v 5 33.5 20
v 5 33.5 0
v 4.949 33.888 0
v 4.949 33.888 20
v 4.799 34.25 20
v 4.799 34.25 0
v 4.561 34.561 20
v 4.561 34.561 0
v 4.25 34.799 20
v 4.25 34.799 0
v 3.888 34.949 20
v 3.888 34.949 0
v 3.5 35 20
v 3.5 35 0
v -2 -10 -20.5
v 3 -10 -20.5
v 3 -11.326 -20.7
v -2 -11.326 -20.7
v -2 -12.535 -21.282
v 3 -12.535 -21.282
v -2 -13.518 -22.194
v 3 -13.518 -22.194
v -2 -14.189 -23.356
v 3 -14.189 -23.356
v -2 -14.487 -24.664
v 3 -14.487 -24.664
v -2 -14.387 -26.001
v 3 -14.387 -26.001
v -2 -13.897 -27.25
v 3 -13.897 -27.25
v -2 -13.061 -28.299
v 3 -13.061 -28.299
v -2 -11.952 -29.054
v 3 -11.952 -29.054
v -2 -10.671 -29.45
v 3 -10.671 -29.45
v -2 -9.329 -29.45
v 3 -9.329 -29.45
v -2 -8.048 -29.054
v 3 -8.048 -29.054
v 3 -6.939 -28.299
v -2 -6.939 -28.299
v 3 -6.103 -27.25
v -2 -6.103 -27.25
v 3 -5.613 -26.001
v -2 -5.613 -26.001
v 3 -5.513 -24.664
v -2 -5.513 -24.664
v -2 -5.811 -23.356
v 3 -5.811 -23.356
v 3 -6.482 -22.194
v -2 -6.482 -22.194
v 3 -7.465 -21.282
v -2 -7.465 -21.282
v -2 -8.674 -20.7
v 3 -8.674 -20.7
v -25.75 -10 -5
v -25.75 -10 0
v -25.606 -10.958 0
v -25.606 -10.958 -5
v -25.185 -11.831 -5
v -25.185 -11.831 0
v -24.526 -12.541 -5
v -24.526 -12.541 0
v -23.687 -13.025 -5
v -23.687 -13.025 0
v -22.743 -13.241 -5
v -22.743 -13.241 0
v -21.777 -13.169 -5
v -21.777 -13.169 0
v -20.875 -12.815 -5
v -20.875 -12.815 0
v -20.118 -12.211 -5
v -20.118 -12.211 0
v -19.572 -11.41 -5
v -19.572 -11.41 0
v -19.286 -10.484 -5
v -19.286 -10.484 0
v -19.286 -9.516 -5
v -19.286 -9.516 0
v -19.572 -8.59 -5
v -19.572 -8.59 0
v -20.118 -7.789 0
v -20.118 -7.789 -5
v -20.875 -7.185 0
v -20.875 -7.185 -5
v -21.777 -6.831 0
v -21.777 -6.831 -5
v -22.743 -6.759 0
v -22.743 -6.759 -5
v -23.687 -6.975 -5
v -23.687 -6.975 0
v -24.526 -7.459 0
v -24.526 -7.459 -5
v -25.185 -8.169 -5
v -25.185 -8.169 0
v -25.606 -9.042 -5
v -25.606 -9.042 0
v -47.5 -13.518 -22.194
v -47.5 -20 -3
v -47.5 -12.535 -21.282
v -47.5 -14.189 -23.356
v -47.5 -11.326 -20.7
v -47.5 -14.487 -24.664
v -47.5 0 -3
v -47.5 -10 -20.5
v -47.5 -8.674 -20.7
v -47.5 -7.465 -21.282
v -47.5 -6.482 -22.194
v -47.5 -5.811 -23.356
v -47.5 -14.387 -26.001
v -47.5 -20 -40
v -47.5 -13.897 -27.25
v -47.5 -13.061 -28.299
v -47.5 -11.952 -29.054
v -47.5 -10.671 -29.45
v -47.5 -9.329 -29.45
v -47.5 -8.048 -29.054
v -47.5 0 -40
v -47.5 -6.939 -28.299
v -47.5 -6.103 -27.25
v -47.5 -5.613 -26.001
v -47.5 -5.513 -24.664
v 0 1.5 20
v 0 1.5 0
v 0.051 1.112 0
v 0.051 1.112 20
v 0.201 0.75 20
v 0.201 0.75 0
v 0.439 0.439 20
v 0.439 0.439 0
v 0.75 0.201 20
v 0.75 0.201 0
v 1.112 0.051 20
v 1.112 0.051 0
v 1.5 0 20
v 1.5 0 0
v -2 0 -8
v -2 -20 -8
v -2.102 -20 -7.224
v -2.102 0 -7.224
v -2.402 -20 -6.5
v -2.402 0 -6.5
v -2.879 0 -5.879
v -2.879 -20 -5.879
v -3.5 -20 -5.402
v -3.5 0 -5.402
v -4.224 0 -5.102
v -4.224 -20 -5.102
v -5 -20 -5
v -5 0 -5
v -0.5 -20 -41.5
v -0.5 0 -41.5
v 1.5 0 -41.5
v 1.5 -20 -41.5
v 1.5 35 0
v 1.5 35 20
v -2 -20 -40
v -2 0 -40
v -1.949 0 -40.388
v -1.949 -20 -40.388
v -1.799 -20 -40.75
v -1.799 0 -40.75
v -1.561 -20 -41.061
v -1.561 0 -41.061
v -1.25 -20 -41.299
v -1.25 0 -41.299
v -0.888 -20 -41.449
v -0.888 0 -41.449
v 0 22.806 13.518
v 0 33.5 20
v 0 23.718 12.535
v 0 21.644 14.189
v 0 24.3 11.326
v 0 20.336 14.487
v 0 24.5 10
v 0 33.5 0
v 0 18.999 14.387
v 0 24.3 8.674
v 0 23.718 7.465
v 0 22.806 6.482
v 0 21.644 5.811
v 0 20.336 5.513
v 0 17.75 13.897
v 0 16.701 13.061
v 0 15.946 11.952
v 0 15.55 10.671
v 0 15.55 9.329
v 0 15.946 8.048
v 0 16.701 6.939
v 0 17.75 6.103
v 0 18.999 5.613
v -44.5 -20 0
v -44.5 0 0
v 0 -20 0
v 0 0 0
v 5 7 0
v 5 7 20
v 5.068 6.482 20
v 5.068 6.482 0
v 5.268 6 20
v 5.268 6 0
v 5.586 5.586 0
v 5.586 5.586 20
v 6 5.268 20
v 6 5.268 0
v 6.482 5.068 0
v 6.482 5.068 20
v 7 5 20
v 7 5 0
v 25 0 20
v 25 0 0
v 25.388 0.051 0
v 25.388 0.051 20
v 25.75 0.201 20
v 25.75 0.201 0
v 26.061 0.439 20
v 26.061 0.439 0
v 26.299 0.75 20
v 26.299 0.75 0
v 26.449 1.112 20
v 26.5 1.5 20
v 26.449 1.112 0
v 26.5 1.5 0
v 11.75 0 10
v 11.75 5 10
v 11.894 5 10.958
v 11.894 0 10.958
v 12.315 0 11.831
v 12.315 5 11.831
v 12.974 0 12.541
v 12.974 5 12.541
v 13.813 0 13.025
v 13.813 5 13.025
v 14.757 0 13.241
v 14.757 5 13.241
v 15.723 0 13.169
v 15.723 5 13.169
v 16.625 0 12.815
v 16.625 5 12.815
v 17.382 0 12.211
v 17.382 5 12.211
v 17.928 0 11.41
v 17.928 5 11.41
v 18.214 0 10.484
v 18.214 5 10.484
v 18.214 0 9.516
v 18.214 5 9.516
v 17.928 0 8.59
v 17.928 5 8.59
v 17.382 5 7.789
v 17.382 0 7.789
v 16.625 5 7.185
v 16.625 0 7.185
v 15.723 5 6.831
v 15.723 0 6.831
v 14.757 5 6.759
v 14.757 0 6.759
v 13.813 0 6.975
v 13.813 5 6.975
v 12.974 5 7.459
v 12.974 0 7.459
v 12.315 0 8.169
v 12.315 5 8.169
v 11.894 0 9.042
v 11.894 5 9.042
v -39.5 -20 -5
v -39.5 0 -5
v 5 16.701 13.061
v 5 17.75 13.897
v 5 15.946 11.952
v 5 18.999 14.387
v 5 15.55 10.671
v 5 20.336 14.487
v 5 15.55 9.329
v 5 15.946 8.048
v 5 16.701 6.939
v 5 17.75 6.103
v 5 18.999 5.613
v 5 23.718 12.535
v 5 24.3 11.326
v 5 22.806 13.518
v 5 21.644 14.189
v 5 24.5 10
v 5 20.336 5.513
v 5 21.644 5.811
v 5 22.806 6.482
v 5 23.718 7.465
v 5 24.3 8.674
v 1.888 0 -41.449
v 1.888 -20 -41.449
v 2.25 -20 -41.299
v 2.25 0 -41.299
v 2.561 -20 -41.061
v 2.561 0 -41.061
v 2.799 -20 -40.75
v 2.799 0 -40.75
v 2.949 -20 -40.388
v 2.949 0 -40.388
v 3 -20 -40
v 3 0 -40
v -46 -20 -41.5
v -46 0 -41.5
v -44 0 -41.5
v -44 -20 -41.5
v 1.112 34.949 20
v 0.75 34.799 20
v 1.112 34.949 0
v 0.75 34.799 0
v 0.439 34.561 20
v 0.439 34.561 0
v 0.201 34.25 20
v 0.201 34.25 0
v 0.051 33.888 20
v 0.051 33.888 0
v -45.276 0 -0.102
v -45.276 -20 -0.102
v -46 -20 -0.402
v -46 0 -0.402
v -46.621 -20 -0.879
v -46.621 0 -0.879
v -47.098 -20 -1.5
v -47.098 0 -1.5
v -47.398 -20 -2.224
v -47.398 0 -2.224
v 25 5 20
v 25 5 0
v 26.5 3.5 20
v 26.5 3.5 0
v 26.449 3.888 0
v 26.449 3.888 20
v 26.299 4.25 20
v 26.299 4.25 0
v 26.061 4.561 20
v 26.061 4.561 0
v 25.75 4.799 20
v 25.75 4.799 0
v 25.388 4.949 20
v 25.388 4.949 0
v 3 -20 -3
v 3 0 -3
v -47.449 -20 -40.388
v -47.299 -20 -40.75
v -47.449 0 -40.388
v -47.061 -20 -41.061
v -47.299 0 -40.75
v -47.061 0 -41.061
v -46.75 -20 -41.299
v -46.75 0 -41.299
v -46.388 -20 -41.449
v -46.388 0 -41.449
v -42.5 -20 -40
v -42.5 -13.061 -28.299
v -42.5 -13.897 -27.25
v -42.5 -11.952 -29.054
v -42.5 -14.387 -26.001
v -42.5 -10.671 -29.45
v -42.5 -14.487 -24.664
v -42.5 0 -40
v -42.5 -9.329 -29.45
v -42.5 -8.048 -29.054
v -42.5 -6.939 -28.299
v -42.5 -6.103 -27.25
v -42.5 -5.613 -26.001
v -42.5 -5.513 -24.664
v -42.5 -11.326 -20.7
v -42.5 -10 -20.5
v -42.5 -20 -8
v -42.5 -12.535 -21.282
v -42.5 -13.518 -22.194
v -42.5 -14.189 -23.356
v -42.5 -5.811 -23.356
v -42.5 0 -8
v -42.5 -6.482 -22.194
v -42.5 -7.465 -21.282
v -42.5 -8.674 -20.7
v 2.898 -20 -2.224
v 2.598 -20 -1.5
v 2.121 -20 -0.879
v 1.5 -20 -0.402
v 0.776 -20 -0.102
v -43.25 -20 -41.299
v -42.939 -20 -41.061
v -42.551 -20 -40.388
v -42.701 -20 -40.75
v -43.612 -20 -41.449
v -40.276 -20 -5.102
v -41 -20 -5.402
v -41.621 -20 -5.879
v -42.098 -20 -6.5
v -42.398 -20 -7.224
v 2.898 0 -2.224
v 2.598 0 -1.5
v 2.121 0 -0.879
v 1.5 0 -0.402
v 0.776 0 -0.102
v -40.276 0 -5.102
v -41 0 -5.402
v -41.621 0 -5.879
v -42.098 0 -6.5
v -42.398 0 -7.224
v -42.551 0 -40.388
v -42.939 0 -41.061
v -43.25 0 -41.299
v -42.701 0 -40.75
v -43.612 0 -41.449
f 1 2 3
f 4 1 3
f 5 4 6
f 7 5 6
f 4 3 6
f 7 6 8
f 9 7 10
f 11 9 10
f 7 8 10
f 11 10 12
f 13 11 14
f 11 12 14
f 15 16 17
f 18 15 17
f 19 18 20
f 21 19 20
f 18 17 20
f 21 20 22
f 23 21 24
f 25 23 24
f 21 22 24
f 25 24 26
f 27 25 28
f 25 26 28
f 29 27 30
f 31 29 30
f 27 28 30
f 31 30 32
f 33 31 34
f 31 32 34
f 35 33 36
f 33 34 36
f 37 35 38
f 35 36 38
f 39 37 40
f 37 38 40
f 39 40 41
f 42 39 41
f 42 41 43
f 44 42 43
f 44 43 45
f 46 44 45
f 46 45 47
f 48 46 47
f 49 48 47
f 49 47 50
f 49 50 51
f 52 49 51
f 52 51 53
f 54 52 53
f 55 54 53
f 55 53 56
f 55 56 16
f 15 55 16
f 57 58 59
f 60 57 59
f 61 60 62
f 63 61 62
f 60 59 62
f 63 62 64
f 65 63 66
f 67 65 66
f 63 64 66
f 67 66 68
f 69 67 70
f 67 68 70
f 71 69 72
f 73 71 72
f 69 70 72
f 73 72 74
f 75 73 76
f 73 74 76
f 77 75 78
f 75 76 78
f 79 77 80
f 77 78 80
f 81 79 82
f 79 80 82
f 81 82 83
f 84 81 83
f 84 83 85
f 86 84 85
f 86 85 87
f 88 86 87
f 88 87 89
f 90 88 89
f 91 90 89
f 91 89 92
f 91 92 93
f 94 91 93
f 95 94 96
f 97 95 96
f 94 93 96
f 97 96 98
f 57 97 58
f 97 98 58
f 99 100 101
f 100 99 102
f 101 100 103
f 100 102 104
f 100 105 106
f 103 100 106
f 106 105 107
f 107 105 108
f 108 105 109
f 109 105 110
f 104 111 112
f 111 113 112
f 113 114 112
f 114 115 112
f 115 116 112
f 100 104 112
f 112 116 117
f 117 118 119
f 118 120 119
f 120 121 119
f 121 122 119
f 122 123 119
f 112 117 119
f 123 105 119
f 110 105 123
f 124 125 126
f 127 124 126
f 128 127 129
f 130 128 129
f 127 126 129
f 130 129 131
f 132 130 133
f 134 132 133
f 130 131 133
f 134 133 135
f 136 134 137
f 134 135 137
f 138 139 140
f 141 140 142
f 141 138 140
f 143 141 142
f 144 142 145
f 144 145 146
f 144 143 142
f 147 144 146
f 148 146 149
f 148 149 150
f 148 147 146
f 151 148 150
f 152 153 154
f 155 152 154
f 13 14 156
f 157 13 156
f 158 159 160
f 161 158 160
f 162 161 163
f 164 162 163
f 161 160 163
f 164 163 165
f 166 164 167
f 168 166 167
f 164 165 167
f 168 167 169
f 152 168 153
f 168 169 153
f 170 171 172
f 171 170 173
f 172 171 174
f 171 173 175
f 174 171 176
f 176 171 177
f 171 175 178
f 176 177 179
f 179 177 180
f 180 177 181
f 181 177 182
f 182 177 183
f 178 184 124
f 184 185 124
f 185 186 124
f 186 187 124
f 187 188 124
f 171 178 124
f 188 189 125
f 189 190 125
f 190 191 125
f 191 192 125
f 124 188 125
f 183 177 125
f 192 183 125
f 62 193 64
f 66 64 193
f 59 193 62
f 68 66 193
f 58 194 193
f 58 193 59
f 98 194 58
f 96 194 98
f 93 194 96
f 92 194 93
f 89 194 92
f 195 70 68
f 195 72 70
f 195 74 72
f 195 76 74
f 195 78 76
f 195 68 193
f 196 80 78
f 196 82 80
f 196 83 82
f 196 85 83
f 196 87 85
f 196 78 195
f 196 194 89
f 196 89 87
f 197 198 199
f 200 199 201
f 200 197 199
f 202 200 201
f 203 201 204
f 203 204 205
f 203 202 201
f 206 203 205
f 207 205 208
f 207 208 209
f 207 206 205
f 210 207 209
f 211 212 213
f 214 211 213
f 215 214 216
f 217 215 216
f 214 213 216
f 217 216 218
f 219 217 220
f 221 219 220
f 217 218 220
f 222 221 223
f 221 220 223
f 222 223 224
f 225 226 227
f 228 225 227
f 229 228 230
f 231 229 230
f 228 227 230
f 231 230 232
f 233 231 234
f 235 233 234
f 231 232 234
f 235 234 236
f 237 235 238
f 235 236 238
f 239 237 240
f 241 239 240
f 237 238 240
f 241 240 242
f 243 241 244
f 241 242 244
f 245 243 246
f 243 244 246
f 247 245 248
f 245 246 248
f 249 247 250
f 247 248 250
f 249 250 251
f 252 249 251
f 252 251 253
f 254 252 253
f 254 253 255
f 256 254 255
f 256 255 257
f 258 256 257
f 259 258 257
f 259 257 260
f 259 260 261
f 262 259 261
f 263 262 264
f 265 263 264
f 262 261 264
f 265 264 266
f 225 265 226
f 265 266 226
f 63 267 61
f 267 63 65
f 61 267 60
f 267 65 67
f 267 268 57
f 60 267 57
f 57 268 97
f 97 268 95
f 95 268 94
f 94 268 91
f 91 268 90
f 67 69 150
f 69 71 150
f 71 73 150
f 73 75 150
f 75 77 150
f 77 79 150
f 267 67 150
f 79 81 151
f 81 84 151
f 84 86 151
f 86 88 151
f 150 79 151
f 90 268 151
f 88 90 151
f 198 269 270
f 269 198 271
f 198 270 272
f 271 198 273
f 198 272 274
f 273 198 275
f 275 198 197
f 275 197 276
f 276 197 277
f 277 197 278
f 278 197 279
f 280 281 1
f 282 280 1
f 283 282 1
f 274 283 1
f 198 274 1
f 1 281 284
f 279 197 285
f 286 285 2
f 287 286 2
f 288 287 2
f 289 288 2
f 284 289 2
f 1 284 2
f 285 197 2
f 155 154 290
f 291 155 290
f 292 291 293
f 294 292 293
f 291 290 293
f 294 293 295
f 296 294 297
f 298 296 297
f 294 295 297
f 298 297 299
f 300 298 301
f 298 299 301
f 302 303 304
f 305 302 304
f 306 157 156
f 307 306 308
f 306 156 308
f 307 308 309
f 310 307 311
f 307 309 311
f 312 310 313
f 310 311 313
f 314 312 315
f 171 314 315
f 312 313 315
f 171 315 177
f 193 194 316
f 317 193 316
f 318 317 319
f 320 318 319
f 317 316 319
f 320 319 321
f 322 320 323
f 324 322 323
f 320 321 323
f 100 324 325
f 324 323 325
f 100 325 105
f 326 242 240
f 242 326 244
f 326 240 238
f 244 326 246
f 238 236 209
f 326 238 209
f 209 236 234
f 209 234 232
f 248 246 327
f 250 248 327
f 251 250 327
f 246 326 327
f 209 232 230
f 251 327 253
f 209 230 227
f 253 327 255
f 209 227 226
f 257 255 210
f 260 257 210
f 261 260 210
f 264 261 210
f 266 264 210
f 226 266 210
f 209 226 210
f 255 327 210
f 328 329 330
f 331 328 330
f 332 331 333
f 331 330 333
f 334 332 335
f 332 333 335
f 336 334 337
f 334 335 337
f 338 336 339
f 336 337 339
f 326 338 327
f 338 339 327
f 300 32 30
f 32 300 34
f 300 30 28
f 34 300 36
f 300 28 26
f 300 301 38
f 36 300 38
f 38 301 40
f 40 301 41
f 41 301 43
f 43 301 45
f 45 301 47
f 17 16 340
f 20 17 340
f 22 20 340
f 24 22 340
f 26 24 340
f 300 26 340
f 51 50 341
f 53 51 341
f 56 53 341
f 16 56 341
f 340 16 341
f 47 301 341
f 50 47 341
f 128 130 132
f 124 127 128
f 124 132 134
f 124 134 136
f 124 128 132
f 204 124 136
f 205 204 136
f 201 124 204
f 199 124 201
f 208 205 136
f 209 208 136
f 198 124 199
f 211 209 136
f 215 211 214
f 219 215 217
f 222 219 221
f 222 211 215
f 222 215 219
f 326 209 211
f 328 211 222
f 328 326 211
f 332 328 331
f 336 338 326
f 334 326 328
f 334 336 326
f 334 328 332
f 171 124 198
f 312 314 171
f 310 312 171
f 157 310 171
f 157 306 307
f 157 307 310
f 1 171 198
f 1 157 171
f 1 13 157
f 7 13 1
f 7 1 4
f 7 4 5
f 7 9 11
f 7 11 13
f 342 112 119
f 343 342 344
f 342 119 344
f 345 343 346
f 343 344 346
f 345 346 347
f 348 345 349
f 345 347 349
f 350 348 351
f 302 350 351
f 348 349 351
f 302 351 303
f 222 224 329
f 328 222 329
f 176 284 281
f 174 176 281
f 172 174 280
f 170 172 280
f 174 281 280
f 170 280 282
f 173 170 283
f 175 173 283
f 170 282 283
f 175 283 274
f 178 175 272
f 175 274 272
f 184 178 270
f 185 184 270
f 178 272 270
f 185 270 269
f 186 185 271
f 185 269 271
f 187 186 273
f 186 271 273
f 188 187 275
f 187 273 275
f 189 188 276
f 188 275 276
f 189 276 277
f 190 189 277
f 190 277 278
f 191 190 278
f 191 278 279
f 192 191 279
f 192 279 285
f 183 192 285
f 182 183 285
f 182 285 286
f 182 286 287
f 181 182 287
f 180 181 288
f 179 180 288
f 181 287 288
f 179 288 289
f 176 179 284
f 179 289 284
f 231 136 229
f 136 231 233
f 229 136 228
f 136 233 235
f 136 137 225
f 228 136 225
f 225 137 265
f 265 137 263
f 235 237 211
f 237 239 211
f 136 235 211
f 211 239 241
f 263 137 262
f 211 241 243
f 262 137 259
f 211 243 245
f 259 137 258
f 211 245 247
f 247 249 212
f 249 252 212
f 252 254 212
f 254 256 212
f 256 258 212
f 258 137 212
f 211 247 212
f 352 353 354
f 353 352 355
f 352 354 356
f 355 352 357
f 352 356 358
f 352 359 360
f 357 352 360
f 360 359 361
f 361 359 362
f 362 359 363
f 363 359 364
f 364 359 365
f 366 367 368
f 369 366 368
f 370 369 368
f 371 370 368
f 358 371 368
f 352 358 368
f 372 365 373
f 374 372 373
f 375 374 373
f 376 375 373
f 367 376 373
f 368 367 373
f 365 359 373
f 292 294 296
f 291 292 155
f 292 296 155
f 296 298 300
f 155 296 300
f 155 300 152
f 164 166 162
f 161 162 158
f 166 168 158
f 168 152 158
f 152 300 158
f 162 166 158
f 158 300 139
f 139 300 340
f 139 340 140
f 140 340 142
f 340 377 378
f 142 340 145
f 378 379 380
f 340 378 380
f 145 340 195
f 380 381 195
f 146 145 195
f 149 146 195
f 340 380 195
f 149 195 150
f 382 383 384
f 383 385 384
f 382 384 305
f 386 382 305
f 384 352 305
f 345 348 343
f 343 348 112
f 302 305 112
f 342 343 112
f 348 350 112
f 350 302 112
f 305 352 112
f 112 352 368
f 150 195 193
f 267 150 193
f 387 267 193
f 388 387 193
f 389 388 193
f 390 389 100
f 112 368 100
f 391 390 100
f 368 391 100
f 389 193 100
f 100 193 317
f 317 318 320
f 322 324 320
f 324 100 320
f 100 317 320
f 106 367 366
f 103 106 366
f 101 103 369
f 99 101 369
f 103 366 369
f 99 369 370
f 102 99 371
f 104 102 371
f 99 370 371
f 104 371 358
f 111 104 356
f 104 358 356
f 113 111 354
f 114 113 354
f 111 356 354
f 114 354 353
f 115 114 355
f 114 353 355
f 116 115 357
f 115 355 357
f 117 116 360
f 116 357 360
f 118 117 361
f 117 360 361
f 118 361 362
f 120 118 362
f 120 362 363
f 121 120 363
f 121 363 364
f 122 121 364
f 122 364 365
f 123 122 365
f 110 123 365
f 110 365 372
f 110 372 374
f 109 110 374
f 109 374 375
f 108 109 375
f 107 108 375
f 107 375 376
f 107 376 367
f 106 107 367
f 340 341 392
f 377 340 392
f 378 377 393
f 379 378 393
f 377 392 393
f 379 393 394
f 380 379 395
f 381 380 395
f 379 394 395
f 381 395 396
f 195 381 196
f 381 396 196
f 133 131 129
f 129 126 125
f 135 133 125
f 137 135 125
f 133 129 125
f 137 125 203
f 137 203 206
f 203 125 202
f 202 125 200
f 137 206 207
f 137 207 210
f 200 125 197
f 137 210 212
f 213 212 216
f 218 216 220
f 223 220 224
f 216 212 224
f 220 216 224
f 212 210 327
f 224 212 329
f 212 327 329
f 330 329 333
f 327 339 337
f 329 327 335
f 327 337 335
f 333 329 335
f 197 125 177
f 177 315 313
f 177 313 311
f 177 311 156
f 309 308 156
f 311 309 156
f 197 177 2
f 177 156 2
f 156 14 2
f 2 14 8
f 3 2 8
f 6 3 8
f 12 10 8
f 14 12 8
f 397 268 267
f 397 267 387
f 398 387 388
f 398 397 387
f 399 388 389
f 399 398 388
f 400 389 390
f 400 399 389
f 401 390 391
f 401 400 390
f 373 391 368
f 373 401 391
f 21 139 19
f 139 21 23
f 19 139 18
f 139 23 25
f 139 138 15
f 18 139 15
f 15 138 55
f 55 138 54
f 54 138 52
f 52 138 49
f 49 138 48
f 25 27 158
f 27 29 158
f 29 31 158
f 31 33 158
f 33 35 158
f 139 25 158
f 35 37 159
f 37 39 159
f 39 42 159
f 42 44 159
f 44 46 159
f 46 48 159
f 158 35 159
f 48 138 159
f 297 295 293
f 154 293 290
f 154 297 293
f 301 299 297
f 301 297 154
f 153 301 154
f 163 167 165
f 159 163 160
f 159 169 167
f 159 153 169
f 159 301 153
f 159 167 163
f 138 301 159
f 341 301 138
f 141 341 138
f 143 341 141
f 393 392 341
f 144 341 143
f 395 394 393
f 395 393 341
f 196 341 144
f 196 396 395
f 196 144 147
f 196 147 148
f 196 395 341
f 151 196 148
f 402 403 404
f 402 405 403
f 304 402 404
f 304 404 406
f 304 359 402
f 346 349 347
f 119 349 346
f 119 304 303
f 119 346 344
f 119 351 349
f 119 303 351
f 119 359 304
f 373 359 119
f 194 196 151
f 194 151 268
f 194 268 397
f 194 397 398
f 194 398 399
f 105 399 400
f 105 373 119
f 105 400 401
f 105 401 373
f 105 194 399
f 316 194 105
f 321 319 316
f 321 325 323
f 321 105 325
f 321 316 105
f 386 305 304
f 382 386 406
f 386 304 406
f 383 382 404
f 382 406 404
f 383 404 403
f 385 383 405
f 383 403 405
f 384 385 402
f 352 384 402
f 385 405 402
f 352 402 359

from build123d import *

# Parameters (mm, degrees)
PAD_DEPTH       = 20
SKETCH001_R     = 4.5
POCKET_DEPTH    = 5
SKETCH002_R     = 3.25
POCKET001_DEPTH = 5
PAD001_DEPTH    = 20
SKETCH004_R     = 3.25
POCKET002_DEPTH = 5
SKETCH005_R     = 4.5
POCKET003_DEPTH = 60


with BuildPart() as optical_table_support:
    # Sketch → Pad (new body)
    with BuildSketch(Plane.XY):
        with BuildLine():
            Line((0, 33.5), (0, 1.5))
            ThreePointArc((0, 1.5), (0.43934, 0.43934), (1.5, 0))
            Line((1.5, 0), (25, 0))
            ThreePointArc((25, 0), (26.06066, 0.43934), (26.5, 1.5))
            Line((26.5, 1.5), (26.5, 3.5))
            ThreePointArc((26.5, 3.5), (26.06066, 4.56066), (25, 5))
            Line((25, 5), (7, 5))
            ThreePointArc((5, 7), (5.585786, 5.585786), (7, 5))
            Line((5, 7), (5, 33.5))
            ThreePointArc((5, 33.5), (4.56066, 34.56066), (3.5, 35))
            Line((3.5, 35), (1.5, 35))
            ThreePointArc((1.5, 35), (0.43934, 34.56066), (0, 33.5))
        make_face()
    extrude(amount=PAD_DEPTH)

    # Sketch001 (on Face1 of Pad) → Pocket (cut)
    with BuildSketch(Plane.YZ.offset(5)):
        with Locations((20, 10)):
            Circle(SKETCH001_R)
    extrude(amount=-POCKET_DEPTH, mode=Mode.SUBTRACT)

    # Sketch002 (on Face7 of Pocket) → Pocket001 (cut)
    with BuildSketch(Plane(origin=(0, 5, 0), x_dir=(-1, 0, 0), z_dir=(0, 1, 0))):
        with Locations((-15, 10)):
            Circle(SKETCH002_R)
    extrude(amount=-POCKET001_DEPTH, mode=Mode.SUBTRACT)


with BuildPart() as lens_support:
    # Sketch003 → Pad001 (new body)
    with BuildSketch(Plane.XZ):
        with BuildLine():
            Line((-44.5, 0), (0, 0))
            ThreePointArc((3, -3), (2.12132, -0.87868), (0, 0))
            Line((3, -40), (3, -3))
            ThreePointArc((1.5, -41.5), (2.56066, -41.06066), (3, -40))
            Line((-0.5, -41.5), (1.5, -41.5))
            ThreePointArc((-2, -40), (-1.56066, -41.06066), (-0.5, -41.5))
            Line((-2, -8), (-2, -40))
            ThreePointArc((-2, -8), (-2.87868, -5.87868), (-5, -5))
            Line((-39.5, -5), (-5, -5))
            ThreePointArc((-39.5, -5), (-41.62132, -5.87868), (-42.5, -8))
            Line((-42.5, -40), (-42.5, -8))
            ThreePointArc((-44, -41.5), (-42.93934, -41.06066), (-42.5, -40))
            Line((-46, -41.5), (-44, -41.5))
            ThreePointArc((-47.5, -40), (-47.06066, -41.06066), (-46, -41.5))
            Line((-47.5, -3), (-47.5, -40))
            ThreePointArc((-44.5, 0), (-46.62132, -0.87868), (-47.5, -3))
        make_face()
    extrude(amount=PAD001_DEPTH)

    # Sketch004 (on Face2 of Pad001) → Pocket002 (cut)
    with BuildSketch(Plane(origin=(0, 0, 0), x_dir=(-1, 0, 0), z_dir=(0, 0, 1))):
        with Locations((22.5, 10)):
            Circle(SKETCH004_R)
    extrude(amount=-POCKET002_DEPTH, mode=Mode.SUBTRACT)

    # Sketch005 (on Face9 of Pocket002) → Pocket003 (cut)
    with BuildSketch(Plane(origin=(3, 0, 0), x_dir=(0, 0, 1), z_dir=(1, 0, 0))):
        with Locations((-25, 10)):
            Circle(SKETCH005_R)
    extrude(amount=-POCKET003_DEPTH, mode=Mode.SUBTRACT)


solid = Compound([optical_table_support.part, lens_support.part])
